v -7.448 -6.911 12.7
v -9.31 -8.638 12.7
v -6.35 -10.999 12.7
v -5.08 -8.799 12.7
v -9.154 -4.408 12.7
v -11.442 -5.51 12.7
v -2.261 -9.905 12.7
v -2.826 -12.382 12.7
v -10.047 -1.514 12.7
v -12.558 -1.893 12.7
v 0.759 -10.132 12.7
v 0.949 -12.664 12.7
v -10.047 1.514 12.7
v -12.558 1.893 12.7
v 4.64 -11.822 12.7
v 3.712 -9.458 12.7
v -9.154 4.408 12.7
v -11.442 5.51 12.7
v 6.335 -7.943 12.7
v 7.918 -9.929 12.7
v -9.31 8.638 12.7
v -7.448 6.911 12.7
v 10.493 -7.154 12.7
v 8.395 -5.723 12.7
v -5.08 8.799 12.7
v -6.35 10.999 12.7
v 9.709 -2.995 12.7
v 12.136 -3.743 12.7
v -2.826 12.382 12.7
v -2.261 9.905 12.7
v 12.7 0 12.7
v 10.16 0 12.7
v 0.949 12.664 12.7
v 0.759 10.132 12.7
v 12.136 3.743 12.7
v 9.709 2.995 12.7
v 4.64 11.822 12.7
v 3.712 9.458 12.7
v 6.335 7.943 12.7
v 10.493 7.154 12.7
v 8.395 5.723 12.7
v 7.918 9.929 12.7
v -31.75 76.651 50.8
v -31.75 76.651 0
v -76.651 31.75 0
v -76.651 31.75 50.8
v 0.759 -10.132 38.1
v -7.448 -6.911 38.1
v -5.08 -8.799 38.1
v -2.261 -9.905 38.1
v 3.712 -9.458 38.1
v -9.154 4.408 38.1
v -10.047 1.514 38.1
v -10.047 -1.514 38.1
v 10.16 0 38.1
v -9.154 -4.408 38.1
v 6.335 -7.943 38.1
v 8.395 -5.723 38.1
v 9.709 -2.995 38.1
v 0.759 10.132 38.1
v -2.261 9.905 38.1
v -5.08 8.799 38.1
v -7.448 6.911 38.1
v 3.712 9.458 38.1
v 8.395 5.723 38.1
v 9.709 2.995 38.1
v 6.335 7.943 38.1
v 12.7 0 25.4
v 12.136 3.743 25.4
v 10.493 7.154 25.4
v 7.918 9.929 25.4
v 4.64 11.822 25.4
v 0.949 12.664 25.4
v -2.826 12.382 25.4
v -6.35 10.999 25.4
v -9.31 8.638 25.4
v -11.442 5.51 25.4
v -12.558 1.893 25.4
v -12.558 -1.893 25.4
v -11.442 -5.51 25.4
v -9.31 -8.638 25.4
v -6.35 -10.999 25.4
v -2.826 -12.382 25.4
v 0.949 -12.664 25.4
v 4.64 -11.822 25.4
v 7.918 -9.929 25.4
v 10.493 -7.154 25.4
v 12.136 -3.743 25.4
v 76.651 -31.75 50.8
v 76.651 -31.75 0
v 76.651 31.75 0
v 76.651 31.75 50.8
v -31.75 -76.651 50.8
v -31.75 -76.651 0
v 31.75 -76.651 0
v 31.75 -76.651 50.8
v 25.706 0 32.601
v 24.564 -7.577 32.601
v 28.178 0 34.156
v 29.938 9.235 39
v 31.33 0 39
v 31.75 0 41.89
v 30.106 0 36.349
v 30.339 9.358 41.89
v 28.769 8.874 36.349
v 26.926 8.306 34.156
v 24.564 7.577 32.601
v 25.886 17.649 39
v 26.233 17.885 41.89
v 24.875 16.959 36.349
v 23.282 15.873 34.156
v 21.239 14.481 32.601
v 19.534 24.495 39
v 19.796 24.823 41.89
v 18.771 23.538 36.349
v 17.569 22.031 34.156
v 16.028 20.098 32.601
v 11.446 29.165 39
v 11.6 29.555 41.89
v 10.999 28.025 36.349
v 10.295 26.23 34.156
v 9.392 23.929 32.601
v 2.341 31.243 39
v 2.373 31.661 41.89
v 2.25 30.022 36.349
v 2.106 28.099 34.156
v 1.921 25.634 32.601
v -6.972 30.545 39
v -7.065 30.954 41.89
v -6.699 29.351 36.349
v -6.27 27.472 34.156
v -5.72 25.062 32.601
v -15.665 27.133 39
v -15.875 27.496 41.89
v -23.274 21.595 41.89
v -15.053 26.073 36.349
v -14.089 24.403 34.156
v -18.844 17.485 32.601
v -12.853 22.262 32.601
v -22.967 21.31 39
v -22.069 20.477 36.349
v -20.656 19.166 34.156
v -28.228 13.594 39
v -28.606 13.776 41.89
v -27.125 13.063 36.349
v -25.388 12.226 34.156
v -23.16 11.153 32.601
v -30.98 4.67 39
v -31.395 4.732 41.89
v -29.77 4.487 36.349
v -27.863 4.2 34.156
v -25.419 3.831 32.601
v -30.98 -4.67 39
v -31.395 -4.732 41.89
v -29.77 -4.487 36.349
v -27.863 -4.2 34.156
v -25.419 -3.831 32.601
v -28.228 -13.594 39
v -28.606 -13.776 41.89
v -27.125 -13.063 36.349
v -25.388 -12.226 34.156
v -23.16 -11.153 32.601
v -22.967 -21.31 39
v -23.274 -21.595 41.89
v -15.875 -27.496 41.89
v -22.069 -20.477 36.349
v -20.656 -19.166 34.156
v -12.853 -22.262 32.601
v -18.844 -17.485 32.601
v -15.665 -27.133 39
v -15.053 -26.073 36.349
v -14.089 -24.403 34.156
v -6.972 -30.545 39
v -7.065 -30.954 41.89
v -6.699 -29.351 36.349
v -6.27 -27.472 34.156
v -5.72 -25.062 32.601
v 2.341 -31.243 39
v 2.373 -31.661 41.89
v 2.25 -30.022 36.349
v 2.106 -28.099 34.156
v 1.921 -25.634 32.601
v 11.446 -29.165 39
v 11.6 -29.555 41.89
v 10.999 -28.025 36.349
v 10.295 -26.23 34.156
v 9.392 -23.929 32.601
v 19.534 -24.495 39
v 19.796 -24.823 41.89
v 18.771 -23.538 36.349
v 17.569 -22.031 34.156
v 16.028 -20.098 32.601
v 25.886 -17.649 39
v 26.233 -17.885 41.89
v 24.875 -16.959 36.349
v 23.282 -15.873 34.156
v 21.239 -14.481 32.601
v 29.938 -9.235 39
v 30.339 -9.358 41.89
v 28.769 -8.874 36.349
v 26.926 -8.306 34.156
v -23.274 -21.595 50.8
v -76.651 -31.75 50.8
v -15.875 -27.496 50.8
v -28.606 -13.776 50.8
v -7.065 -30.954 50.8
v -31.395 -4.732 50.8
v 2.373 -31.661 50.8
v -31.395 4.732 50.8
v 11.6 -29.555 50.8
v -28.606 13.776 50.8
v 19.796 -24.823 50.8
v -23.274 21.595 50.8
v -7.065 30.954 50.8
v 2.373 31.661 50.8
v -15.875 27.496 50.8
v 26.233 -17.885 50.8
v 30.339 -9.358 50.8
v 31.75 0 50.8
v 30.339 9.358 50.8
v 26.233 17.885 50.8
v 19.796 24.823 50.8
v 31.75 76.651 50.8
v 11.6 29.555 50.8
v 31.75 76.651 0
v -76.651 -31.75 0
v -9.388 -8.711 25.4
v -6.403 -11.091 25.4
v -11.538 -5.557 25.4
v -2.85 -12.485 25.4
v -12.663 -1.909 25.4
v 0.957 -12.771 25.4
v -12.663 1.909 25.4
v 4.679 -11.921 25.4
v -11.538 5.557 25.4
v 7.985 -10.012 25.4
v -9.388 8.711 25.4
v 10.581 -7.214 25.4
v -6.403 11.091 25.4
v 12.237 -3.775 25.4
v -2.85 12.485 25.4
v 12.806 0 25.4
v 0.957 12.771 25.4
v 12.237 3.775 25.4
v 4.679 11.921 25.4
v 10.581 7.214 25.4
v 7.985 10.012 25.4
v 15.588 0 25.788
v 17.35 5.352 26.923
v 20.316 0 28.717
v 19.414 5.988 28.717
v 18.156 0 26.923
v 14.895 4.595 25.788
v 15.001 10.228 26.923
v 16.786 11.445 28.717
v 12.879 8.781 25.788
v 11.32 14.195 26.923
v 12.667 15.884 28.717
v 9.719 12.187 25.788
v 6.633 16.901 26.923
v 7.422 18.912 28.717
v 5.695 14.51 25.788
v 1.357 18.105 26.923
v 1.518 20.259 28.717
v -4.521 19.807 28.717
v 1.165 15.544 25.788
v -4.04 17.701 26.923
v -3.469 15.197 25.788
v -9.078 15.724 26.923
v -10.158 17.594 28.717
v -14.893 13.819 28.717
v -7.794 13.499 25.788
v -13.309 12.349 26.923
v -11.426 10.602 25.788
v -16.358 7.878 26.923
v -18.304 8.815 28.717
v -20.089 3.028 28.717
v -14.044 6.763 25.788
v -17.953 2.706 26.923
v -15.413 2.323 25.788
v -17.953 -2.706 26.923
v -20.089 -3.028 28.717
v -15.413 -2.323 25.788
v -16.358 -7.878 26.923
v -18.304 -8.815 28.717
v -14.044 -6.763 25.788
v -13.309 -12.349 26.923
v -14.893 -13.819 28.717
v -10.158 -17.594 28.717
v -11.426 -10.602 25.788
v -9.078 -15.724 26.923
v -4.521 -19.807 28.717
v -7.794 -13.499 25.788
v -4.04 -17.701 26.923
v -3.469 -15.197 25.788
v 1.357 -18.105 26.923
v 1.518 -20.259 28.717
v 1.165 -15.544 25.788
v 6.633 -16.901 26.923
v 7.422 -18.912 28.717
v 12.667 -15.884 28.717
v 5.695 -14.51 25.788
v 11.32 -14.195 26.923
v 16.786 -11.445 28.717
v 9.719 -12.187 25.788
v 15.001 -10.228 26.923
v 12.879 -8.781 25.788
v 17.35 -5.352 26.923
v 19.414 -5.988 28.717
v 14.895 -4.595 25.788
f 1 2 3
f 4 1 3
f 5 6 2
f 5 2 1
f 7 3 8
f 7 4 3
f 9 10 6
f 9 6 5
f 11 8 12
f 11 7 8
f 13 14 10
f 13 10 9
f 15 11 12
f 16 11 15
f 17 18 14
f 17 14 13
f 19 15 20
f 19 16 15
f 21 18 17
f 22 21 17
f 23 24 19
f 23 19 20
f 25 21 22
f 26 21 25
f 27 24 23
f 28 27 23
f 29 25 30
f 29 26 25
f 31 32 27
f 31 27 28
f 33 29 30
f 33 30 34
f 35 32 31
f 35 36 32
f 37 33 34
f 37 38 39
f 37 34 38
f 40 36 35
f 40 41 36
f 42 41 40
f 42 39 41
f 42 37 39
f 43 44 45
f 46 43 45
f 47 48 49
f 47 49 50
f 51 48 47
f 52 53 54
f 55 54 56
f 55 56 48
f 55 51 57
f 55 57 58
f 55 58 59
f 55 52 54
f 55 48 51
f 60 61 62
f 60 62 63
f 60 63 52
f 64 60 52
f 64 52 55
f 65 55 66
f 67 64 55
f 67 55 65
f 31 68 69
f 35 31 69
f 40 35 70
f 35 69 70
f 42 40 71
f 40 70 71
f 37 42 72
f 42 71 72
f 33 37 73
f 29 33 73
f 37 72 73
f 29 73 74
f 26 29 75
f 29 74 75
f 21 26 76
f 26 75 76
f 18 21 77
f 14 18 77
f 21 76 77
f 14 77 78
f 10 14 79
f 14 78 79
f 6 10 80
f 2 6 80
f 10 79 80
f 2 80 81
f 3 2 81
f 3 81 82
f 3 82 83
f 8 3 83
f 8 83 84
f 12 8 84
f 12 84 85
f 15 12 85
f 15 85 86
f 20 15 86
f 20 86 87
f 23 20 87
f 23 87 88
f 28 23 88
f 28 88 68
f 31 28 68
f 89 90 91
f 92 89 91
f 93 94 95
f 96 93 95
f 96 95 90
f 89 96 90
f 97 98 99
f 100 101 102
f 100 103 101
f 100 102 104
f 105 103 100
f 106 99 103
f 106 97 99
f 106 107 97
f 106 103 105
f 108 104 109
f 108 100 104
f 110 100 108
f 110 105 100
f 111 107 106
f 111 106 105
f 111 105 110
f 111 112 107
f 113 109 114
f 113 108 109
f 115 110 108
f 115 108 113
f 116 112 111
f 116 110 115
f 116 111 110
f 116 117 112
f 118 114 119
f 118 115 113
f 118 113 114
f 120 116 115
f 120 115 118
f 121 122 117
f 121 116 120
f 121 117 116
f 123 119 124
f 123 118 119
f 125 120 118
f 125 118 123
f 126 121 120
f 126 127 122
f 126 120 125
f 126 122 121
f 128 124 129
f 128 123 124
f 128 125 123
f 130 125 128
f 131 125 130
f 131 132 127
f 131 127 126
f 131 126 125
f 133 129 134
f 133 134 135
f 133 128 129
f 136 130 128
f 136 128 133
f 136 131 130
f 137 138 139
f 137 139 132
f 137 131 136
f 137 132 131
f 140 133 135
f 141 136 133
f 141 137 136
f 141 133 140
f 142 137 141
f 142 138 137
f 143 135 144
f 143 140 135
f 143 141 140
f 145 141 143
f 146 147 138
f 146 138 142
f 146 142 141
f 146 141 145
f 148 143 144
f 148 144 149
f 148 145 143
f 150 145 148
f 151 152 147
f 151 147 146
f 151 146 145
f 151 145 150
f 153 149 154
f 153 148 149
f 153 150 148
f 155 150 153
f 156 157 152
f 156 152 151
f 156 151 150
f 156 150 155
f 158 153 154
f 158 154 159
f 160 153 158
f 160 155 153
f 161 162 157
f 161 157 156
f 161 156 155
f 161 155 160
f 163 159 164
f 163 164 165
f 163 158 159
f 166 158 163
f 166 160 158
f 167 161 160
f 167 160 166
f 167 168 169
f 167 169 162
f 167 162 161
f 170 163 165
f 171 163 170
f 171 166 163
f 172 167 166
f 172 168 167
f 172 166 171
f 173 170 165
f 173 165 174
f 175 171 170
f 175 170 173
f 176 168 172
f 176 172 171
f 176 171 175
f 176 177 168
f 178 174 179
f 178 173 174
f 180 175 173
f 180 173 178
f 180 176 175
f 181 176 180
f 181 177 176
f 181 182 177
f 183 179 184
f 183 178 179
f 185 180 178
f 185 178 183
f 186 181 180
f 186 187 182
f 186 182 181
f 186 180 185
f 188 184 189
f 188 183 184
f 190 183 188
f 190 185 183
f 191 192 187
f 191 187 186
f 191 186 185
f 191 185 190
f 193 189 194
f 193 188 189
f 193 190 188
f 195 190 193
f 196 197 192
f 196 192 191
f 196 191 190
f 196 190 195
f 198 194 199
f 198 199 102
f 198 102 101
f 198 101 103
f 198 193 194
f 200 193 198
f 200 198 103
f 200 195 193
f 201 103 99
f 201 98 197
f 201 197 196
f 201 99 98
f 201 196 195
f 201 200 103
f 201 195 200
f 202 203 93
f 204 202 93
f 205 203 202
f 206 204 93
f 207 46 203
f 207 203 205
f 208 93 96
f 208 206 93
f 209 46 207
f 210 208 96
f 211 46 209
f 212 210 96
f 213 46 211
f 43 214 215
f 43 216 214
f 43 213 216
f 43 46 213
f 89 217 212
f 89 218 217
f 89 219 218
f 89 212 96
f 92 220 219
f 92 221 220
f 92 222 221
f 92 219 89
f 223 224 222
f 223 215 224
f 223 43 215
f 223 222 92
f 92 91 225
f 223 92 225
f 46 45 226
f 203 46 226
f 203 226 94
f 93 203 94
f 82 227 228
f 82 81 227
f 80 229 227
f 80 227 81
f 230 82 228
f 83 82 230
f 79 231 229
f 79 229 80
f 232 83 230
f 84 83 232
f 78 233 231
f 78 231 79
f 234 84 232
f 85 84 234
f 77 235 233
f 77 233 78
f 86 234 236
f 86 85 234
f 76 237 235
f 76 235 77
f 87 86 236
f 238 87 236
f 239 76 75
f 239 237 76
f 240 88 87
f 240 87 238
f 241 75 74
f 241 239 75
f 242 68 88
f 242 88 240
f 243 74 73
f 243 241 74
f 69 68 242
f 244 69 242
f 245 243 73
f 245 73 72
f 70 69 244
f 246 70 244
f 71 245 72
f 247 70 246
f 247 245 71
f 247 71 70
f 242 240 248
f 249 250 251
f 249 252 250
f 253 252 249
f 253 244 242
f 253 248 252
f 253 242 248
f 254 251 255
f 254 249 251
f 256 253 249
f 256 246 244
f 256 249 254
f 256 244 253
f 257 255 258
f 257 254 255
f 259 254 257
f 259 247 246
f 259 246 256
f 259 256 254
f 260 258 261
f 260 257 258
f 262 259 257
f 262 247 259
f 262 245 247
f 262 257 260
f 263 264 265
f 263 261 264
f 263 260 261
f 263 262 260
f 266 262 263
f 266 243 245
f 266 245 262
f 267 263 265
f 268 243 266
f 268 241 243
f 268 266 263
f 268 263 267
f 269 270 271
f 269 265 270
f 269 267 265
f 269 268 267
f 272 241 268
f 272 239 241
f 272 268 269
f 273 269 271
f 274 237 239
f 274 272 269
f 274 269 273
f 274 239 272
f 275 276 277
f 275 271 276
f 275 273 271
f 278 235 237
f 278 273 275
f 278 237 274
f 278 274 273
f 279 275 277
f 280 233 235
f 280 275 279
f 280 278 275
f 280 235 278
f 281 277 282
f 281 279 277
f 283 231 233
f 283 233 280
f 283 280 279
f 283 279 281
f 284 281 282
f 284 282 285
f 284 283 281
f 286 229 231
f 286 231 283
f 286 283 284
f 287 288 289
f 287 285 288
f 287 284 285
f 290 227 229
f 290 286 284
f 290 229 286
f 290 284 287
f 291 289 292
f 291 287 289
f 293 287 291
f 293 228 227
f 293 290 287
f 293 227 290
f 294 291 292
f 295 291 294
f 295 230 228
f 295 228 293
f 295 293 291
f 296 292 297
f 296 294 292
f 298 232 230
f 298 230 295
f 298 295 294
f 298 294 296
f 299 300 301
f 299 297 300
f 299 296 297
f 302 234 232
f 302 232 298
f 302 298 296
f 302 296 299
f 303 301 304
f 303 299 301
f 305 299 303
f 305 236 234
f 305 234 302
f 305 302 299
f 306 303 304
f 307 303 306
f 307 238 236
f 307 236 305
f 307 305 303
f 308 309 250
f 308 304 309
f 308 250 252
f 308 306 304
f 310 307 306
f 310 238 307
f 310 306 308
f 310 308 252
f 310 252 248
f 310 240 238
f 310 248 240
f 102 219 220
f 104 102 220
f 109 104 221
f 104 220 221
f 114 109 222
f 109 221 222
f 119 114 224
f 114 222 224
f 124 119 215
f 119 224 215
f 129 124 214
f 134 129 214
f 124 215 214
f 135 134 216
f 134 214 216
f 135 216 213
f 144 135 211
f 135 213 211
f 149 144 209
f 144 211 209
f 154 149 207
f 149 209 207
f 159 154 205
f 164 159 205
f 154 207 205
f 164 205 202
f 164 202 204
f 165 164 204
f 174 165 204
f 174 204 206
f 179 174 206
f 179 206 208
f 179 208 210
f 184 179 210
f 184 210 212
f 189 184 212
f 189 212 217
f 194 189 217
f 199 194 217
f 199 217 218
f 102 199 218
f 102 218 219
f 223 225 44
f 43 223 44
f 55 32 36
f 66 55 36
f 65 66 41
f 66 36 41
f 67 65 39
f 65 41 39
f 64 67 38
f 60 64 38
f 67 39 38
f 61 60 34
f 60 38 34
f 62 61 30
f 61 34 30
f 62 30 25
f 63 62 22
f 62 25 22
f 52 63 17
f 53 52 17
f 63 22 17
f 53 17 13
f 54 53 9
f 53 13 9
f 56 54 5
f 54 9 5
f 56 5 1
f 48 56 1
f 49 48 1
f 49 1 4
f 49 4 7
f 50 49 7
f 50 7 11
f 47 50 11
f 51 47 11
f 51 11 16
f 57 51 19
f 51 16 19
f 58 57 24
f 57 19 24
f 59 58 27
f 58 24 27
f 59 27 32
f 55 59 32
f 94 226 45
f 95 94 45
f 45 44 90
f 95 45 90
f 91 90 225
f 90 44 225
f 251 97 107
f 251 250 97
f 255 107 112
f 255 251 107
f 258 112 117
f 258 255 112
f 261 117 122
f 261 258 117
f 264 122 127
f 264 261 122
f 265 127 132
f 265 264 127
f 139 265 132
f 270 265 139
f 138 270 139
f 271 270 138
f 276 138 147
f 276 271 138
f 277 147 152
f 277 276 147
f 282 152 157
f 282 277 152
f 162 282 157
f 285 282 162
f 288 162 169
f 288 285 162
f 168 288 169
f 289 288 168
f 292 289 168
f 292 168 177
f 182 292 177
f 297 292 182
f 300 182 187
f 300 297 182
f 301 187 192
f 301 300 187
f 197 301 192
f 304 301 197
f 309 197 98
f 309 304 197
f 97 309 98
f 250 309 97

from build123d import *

# Parameters (mm, degrees)
F1_DEPTH  = 50.8
F2_R      = 31.75
F3_DEPTH  = 19.05
F4_R      = 12.7
F5_DEPTH  = 38.1
F6_R      = 22.225
F7_DEPTH  = 25.4
F11_R     = 10.16
F12_DEPTH = 25.4


# Not quite as in the source:
# - a fillet or chamfer that OpenCascade refuses, or shapes differently, is made with other operations: its cross-section is extruded or revolved along the edge and cut away or added


with BuildPart() as f1:
    # F0 (on Top) → F1 (new body)
    with BuildSketch(Plane.XY):
        Polygon((76.6512806053, -31.75), (76.6512806053, 31.75), (31.75, 76.6512806053), (-31.75, 76.6512806053), (-76.6512806053, 31.75), (-76.6512806053, -31.75), (-31.75, -76.6512806053), (31.75, -76.6512806053), align=None)
    extrude(amount=F1_DEPTH)

    # F2 (on face) → F3 (cut)
    with BuildSketch(Plane.XY.offset(50.8)):
        Circle(F2_R)
    extrude(amount=-F3_DEPTH, mode=Mode.SUBTRACT)

    # F4 (on face) → F5 (cut)
    with BuildSketch(Plane.XY.offset(50.8)):
        Circle(F4_R)
    extrude(amount=-F5_DEPTH, mode=Mode.SUBTRACT)

    # F6 (on face) → F7 (cut)
    with BuildSketch(Plane.XY.offset(50.8)):
        Circle(F6_R)
    extrude(amount=-F7_DEPTH, mode=Mode.SUBTRACT)

    # F8: fillet of radius 10.16 on 1 edges, made by hand

    # F8_s1 → F8_t2 (revolve)
    with BuildSketch(Plane.XZ):
        with BuildLine():
            ThreePointArc((31.75, 41.8901368334), (28.9953089065, 34.9340603531), (22.225, 31.75))
            Line((22.225, 31.75), (31.75, 31.75))
            Line((31.75, 31.75), (31.75, 41.8901368334))
        make_face()
    revolve(axis=Axis((0, 0, 31.75), (0, 0, 1)))

    # F9: fillet of radius 10.16 on 1 edges, made by hand

    # F9_s1 → F9_t2 (revolve)
    with BuildSketch(Plane.XZ):
        with BuildLine():
            ThreePointArc((22.225, 31.75), (18.4860405842, 27.1357730325), (12.8064279214, 25.4))
            Line((12.8064279214, 25.4), (22.225, 25.4))
            Line((22.225, 25.4), (22.225, 31.75))
        make_face()
    revolve(axis=Axis((0, 0, 25.4), (0, 0, 1)))

    # F10: chamfer of 10.16 on 1 edges, made by hand

    # F10_s1 → F10_t2 (revolve, cut)
    with BuildSketch(Plane.XZ):
        with BuildLine():
            Line((26.0358422648, 32.838882269), (19.9865565056, 28.4792884435))
            Line((19.9865565056, 28.4792884435), (19.8363599068, 28.6161504971))
            ThreePointArc((19.8363599068, 28.6161504971), (21.1312925718, 30.0979038097), (22.0366285584, 31.8262))
            Line((22.0366285584, 31.8262), (22.2123, 31.9528027367))
            ThreePointArc((22.2123, 31.9528027367), (24.1382310347, 32.2649415193), (25.9535194466, 33.0246595378))
            Line((25.9535194466, 33.0246595378), (26.0358422648, 32.838882269))
        make_face()
    revolve(axis=Axis((0, 0, 31.75), (0, 0, 1)), mode=Mode.SUBTRACT)

    # F11 (on face) → F12 (join)
    with BuildSketch(Plane.XY.offset(12.7)):
        Circle(F11_R)
    extrude(amount=F12_DEPTH)


solid = f1.part
